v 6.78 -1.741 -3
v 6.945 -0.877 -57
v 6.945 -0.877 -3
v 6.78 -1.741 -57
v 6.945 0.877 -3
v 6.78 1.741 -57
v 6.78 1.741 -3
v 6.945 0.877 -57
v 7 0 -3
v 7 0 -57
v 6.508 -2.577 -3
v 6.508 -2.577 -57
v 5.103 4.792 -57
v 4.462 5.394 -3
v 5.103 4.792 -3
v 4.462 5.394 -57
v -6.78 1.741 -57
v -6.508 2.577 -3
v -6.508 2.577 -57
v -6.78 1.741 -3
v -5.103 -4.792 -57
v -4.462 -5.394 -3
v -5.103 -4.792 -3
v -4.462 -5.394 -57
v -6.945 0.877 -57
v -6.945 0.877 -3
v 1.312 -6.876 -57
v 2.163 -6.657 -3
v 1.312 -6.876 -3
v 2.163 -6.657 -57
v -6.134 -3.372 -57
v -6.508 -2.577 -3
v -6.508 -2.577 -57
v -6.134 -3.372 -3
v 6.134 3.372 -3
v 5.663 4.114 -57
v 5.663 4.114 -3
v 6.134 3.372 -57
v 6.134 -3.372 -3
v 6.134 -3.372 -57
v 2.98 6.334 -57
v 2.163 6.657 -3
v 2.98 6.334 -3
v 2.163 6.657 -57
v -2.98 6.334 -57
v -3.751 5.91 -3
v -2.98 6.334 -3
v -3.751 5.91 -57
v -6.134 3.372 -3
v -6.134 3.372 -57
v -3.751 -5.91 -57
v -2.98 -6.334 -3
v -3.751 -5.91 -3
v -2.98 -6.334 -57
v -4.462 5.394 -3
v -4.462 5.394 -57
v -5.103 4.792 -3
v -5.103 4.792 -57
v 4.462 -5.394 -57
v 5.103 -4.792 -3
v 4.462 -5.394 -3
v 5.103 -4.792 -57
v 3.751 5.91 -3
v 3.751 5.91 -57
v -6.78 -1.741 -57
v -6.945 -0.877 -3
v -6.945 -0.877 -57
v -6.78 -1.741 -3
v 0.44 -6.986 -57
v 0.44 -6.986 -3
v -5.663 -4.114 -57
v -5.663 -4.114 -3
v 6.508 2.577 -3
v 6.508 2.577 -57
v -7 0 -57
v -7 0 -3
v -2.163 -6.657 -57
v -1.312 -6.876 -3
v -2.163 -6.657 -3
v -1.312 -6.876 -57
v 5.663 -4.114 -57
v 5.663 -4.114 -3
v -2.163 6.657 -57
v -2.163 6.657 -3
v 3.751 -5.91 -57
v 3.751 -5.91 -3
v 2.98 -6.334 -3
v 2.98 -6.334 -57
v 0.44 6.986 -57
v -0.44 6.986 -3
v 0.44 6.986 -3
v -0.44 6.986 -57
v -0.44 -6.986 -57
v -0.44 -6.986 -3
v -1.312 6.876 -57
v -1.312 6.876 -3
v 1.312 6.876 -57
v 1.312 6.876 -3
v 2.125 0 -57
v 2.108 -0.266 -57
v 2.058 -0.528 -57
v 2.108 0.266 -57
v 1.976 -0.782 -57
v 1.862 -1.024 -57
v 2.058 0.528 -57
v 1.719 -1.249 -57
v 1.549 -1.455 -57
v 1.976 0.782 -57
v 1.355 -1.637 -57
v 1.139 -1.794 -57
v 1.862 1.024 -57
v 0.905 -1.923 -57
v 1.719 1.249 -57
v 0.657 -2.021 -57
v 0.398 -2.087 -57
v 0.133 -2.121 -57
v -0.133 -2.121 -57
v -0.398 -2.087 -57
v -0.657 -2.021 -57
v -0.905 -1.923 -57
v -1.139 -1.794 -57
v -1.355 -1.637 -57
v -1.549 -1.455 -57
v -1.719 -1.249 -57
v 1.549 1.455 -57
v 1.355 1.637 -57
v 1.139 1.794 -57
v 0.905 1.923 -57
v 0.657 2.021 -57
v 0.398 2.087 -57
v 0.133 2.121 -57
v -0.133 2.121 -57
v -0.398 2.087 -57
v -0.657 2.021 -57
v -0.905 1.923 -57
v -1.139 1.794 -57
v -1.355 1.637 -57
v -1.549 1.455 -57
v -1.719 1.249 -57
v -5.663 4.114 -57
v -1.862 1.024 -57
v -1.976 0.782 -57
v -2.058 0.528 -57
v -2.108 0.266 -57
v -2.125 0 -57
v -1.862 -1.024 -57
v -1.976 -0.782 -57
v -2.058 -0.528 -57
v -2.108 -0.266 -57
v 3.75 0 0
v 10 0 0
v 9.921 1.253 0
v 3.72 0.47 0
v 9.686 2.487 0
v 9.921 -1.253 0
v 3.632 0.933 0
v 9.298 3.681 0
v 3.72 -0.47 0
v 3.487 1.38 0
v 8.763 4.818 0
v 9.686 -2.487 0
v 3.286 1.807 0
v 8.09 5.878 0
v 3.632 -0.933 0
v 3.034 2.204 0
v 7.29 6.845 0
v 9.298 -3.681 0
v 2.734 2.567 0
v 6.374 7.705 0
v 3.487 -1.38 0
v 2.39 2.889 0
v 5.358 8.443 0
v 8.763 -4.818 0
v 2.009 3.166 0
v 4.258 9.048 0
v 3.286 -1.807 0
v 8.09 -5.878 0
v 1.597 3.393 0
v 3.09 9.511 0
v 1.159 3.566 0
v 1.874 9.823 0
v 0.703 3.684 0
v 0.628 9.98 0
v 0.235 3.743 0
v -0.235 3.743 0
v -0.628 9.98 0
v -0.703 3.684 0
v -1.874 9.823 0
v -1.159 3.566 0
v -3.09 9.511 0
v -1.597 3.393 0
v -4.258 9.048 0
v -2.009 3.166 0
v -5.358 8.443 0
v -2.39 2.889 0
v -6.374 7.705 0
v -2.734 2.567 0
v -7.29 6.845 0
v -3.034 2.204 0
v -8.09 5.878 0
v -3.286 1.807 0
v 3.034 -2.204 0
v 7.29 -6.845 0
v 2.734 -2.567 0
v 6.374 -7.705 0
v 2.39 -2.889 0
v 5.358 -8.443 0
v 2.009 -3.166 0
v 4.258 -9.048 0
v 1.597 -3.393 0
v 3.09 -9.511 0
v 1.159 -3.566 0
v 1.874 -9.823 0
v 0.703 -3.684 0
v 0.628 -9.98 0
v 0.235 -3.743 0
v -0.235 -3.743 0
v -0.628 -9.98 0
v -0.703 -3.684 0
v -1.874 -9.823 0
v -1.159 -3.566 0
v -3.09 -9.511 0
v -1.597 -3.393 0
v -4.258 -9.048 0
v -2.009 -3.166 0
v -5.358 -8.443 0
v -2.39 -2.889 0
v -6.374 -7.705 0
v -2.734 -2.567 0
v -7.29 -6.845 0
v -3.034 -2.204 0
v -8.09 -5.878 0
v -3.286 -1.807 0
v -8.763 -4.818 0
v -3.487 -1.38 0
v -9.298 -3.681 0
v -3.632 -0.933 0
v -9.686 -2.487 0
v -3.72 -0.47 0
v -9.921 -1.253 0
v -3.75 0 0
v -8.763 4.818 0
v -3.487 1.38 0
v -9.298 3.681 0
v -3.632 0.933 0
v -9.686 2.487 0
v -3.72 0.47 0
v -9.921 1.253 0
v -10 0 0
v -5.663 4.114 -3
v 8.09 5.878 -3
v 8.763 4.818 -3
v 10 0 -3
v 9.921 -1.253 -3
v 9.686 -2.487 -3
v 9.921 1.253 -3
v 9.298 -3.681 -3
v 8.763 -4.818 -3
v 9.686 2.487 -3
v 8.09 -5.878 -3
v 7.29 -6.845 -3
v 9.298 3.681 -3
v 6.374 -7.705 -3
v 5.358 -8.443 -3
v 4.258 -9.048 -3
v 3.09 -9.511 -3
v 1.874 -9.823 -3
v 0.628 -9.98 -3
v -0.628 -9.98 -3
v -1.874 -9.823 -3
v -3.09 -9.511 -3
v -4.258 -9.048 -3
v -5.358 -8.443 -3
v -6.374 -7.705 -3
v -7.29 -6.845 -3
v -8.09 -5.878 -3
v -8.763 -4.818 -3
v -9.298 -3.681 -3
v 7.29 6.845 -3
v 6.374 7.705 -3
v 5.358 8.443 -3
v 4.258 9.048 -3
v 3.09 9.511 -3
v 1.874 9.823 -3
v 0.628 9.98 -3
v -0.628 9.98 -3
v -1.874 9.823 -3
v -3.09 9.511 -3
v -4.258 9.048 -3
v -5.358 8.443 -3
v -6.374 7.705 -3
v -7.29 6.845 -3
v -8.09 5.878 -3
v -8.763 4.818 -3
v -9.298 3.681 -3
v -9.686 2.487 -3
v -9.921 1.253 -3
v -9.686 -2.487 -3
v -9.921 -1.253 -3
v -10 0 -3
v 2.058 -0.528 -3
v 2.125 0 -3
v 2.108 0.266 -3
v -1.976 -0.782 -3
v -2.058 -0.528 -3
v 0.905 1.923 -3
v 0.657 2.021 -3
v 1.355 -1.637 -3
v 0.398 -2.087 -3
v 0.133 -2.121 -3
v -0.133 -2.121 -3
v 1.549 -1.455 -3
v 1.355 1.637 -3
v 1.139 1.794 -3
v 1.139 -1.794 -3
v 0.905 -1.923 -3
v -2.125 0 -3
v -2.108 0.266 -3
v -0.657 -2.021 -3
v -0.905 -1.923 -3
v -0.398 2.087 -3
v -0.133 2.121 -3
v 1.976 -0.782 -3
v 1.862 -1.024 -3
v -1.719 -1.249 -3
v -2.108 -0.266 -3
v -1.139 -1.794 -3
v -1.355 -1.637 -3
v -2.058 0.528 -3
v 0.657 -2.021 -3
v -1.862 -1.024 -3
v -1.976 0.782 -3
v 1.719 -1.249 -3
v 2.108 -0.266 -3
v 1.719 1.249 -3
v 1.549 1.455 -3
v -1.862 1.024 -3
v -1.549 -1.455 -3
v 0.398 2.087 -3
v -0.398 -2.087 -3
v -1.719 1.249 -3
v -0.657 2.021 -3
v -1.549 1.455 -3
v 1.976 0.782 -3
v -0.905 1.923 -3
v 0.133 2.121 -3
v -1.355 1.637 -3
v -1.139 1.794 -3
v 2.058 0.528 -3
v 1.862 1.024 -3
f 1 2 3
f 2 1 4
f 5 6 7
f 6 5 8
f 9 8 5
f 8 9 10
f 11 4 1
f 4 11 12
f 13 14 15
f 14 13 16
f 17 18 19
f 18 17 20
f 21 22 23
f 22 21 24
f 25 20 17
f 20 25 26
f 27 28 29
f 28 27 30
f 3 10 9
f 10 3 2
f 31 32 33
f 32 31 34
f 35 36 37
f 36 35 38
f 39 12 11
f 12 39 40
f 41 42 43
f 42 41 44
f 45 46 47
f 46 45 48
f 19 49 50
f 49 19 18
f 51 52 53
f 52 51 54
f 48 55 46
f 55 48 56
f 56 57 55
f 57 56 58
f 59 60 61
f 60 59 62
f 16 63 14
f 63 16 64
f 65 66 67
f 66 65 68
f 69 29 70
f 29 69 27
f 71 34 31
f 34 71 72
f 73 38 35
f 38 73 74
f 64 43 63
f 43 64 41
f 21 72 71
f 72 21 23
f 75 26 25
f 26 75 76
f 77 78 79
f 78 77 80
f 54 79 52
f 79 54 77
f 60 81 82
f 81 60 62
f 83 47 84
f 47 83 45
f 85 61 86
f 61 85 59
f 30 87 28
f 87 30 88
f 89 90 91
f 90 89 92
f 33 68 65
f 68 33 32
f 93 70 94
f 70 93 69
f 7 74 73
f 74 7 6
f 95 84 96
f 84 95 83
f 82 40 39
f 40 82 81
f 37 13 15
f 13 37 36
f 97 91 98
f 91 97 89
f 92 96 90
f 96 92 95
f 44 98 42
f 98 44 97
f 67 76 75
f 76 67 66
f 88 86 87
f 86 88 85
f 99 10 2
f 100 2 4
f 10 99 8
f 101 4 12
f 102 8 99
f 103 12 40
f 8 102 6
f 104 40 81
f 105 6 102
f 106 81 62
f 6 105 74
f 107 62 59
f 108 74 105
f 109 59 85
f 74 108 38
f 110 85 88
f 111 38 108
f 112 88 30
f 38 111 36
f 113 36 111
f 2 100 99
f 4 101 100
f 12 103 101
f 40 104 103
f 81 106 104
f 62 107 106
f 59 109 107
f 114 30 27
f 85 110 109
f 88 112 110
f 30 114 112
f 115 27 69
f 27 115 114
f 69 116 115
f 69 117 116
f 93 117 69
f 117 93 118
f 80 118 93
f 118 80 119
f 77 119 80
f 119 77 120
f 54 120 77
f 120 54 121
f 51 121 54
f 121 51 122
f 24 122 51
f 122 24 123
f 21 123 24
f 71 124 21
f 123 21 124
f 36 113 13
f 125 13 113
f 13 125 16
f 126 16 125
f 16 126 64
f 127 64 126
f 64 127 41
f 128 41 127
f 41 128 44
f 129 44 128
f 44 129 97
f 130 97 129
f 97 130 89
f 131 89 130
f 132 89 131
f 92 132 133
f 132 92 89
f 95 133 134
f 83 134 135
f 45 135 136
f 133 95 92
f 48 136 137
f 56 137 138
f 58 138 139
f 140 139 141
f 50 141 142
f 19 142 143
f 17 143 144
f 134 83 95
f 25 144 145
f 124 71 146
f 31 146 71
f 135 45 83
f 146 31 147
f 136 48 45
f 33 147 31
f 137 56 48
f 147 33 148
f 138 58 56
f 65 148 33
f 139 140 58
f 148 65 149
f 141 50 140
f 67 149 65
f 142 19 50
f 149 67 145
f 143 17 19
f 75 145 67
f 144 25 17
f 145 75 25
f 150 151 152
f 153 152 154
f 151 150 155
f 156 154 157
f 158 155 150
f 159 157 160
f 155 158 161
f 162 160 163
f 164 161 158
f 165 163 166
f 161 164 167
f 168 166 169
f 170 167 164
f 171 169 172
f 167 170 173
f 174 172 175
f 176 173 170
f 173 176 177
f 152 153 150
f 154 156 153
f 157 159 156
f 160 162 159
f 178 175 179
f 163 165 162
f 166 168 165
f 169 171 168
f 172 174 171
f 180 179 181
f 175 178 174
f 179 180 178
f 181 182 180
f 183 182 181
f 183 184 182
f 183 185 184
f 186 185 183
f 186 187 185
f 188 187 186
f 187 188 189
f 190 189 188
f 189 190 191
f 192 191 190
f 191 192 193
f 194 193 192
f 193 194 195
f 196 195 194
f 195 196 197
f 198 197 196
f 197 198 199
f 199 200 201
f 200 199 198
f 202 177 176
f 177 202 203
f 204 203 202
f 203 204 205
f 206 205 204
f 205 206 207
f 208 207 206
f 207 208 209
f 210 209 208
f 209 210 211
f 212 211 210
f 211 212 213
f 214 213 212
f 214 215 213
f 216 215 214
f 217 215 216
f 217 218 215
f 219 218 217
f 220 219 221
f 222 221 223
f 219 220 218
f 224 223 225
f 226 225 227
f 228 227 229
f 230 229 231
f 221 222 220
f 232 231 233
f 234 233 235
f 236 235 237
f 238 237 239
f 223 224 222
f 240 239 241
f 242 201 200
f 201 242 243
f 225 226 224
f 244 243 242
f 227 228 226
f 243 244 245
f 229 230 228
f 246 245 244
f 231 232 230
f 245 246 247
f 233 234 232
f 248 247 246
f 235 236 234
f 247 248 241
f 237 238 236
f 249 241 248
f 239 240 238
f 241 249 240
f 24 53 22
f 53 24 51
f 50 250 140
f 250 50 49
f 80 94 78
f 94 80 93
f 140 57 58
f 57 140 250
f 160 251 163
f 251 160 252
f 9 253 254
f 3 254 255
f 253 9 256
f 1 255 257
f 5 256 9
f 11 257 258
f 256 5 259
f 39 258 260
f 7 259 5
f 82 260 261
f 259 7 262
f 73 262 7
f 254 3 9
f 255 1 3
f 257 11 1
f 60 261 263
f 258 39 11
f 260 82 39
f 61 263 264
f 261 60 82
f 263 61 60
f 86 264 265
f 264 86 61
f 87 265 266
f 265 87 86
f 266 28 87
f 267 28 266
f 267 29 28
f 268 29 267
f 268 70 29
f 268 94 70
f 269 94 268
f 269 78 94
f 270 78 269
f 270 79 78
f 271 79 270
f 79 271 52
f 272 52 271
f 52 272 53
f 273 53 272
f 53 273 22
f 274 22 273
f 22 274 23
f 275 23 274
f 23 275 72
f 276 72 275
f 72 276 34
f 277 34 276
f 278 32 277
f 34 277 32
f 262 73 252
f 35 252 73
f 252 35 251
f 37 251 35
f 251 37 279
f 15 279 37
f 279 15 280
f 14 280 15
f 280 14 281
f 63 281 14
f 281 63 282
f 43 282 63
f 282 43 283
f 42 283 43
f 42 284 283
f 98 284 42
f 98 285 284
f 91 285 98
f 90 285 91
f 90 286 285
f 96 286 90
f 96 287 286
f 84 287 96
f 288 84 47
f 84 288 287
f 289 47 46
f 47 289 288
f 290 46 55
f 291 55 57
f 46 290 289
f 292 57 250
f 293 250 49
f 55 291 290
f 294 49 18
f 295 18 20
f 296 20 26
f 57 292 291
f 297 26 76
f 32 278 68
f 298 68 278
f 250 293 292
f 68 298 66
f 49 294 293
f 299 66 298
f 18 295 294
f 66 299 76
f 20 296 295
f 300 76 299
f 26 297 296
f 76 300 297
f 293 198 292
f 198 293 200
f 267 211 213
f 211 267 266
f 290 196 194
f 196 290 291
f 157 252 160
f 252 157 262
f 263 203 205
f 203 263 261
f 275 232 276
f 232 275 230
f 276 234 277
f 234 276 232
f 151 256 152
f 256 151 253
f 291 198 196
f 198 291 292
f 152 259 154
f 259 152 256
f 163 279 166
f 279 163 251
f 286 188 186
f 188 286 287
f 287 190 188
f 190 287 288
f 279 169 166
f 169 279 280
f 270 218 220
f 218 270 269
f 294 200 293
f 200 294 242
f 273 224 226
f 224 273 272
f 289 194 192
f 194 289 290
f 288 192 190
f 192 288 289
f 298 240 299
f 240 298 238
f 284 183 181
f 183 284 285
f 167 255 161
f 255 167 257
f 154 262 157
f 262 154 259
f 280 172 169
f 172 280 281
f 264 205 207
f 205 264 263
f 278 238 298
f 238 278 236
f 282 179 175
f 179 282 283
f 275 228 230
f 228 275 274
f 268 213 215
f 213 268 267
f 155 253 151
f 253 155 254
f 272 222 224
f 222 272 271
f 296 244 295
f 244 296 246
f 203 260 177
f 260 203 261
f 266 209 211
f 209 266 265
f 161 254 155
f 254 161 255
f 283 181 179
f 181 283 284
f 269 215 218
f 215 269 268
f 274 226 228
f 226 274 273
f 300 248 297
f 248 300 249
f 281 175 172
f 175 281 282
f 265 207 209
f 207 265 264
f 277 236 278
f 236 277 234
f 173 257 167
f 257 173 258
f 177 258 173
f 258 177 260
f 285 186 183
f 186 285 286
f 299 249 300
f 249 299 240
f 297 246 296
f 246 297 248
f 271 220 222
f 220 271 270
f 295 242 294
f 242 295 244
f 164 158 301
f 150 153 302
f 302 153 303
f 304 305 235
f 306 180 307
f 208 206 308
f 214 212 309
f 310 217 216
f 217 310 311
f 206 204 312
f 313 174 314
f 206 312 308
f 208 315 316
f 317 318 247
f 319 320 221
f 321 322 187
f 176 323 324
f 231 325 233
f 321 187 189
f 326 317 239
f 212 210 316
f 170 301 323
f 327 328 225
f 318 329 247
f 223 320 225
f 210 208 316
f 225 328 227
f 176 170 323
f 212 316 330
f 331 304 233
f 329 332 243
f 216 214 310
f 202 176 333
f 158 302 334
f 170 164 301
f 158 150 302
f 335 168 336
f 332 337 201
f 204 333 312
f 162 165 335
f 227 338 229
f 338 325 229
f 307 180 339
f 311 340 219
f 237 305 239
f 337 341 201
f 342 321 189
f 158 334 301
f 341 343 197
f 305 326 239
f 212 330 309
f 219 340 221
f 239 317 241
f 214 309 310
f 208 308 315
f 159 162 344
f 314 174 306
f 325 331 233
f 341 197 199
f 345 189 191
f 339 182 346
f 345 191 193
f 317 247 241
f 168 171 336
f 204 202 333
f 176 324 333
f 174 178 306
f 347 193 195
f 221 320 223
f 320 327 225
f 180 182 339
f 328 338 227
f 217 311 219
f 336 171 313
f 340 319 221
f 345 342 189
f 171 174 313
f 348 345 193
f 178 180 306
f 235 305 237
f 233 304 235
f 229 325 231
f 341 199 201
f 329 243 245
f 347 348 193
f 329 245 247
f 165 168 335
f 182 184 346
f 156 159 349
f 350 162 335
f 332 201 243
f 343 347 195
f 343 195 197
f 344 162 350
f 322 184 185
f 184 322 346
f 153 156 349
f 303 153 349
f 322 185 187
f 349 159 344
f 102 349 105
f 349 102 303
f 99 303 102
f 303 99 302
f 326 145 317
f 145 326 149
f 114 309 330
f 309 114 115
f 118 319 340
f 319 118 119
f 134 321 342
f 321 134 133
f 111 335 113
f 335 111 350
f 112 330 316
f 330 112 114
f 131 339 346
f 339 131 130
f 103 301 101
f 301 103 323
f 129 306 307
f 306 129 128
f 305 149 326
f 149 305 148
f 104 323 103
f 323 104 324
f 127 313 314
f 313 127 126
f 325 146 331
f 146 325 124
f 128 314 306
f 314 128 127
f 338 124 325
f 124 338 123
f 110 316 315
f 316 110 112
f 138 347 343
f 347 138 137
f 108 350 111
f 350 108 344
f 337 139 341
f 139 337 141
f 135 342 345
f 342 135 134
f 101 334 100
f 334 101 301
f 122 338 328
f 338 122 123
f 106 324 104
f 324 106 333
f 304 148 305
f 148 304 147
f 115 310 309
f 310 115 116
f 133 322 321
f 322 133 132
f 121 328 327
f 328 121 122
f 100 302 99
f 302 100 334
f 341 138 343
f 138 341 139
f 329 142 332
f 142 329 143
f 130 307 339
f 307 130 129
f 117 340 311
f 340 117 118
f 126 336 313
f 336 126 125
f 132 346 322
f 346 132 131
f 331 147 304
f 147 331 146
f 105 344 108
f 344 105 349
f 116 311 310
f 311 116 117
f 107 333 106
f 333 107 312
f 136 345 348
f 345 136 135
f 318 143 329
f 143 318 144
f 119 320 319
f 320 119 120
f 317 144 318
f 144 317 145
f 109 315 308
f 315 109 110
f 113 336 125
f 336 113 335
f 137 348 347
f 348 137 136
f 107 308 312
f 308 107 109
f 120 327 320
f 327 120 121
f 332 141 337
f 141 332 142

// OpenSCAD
$fn = 50;


difference() {
	union() {
		translate(v = [0, 0, -57.0000000000]) {
			cylinder(h = 57, r = 7.0000000000);
		}
		translate(v = [0, 0, -3.0000000000]) {
			cylinder(h = 3, r = 10.0000000000);
		}
	}
	union() {
		translate(v = [0, 0, 0]) {
			rotate(a = [0, 0, 0]) {
				difference() {
					union() {
						#translate(v = [0, 0, -57.0000000000]) {
							cylinder(h = 57, r = 2.0000000000);
						}
						#translate(v = [0, 0, -3]) {
							cylinder(h = 3, r = 7.0000000000, r1 = 2.1250000000, r2 = 3.7500000000);
						}
						#translate(v = [0, 0, -57.0000000000]) {
							cylinder(h = 57, r = 2.1250000000);
						}
						#translate(v = [0, 0, -57.0000000000]) {
							cylinder(h = 57, r = 2.0000000000);
						}
					}
					union();
				}
			}
		}
	}
}
